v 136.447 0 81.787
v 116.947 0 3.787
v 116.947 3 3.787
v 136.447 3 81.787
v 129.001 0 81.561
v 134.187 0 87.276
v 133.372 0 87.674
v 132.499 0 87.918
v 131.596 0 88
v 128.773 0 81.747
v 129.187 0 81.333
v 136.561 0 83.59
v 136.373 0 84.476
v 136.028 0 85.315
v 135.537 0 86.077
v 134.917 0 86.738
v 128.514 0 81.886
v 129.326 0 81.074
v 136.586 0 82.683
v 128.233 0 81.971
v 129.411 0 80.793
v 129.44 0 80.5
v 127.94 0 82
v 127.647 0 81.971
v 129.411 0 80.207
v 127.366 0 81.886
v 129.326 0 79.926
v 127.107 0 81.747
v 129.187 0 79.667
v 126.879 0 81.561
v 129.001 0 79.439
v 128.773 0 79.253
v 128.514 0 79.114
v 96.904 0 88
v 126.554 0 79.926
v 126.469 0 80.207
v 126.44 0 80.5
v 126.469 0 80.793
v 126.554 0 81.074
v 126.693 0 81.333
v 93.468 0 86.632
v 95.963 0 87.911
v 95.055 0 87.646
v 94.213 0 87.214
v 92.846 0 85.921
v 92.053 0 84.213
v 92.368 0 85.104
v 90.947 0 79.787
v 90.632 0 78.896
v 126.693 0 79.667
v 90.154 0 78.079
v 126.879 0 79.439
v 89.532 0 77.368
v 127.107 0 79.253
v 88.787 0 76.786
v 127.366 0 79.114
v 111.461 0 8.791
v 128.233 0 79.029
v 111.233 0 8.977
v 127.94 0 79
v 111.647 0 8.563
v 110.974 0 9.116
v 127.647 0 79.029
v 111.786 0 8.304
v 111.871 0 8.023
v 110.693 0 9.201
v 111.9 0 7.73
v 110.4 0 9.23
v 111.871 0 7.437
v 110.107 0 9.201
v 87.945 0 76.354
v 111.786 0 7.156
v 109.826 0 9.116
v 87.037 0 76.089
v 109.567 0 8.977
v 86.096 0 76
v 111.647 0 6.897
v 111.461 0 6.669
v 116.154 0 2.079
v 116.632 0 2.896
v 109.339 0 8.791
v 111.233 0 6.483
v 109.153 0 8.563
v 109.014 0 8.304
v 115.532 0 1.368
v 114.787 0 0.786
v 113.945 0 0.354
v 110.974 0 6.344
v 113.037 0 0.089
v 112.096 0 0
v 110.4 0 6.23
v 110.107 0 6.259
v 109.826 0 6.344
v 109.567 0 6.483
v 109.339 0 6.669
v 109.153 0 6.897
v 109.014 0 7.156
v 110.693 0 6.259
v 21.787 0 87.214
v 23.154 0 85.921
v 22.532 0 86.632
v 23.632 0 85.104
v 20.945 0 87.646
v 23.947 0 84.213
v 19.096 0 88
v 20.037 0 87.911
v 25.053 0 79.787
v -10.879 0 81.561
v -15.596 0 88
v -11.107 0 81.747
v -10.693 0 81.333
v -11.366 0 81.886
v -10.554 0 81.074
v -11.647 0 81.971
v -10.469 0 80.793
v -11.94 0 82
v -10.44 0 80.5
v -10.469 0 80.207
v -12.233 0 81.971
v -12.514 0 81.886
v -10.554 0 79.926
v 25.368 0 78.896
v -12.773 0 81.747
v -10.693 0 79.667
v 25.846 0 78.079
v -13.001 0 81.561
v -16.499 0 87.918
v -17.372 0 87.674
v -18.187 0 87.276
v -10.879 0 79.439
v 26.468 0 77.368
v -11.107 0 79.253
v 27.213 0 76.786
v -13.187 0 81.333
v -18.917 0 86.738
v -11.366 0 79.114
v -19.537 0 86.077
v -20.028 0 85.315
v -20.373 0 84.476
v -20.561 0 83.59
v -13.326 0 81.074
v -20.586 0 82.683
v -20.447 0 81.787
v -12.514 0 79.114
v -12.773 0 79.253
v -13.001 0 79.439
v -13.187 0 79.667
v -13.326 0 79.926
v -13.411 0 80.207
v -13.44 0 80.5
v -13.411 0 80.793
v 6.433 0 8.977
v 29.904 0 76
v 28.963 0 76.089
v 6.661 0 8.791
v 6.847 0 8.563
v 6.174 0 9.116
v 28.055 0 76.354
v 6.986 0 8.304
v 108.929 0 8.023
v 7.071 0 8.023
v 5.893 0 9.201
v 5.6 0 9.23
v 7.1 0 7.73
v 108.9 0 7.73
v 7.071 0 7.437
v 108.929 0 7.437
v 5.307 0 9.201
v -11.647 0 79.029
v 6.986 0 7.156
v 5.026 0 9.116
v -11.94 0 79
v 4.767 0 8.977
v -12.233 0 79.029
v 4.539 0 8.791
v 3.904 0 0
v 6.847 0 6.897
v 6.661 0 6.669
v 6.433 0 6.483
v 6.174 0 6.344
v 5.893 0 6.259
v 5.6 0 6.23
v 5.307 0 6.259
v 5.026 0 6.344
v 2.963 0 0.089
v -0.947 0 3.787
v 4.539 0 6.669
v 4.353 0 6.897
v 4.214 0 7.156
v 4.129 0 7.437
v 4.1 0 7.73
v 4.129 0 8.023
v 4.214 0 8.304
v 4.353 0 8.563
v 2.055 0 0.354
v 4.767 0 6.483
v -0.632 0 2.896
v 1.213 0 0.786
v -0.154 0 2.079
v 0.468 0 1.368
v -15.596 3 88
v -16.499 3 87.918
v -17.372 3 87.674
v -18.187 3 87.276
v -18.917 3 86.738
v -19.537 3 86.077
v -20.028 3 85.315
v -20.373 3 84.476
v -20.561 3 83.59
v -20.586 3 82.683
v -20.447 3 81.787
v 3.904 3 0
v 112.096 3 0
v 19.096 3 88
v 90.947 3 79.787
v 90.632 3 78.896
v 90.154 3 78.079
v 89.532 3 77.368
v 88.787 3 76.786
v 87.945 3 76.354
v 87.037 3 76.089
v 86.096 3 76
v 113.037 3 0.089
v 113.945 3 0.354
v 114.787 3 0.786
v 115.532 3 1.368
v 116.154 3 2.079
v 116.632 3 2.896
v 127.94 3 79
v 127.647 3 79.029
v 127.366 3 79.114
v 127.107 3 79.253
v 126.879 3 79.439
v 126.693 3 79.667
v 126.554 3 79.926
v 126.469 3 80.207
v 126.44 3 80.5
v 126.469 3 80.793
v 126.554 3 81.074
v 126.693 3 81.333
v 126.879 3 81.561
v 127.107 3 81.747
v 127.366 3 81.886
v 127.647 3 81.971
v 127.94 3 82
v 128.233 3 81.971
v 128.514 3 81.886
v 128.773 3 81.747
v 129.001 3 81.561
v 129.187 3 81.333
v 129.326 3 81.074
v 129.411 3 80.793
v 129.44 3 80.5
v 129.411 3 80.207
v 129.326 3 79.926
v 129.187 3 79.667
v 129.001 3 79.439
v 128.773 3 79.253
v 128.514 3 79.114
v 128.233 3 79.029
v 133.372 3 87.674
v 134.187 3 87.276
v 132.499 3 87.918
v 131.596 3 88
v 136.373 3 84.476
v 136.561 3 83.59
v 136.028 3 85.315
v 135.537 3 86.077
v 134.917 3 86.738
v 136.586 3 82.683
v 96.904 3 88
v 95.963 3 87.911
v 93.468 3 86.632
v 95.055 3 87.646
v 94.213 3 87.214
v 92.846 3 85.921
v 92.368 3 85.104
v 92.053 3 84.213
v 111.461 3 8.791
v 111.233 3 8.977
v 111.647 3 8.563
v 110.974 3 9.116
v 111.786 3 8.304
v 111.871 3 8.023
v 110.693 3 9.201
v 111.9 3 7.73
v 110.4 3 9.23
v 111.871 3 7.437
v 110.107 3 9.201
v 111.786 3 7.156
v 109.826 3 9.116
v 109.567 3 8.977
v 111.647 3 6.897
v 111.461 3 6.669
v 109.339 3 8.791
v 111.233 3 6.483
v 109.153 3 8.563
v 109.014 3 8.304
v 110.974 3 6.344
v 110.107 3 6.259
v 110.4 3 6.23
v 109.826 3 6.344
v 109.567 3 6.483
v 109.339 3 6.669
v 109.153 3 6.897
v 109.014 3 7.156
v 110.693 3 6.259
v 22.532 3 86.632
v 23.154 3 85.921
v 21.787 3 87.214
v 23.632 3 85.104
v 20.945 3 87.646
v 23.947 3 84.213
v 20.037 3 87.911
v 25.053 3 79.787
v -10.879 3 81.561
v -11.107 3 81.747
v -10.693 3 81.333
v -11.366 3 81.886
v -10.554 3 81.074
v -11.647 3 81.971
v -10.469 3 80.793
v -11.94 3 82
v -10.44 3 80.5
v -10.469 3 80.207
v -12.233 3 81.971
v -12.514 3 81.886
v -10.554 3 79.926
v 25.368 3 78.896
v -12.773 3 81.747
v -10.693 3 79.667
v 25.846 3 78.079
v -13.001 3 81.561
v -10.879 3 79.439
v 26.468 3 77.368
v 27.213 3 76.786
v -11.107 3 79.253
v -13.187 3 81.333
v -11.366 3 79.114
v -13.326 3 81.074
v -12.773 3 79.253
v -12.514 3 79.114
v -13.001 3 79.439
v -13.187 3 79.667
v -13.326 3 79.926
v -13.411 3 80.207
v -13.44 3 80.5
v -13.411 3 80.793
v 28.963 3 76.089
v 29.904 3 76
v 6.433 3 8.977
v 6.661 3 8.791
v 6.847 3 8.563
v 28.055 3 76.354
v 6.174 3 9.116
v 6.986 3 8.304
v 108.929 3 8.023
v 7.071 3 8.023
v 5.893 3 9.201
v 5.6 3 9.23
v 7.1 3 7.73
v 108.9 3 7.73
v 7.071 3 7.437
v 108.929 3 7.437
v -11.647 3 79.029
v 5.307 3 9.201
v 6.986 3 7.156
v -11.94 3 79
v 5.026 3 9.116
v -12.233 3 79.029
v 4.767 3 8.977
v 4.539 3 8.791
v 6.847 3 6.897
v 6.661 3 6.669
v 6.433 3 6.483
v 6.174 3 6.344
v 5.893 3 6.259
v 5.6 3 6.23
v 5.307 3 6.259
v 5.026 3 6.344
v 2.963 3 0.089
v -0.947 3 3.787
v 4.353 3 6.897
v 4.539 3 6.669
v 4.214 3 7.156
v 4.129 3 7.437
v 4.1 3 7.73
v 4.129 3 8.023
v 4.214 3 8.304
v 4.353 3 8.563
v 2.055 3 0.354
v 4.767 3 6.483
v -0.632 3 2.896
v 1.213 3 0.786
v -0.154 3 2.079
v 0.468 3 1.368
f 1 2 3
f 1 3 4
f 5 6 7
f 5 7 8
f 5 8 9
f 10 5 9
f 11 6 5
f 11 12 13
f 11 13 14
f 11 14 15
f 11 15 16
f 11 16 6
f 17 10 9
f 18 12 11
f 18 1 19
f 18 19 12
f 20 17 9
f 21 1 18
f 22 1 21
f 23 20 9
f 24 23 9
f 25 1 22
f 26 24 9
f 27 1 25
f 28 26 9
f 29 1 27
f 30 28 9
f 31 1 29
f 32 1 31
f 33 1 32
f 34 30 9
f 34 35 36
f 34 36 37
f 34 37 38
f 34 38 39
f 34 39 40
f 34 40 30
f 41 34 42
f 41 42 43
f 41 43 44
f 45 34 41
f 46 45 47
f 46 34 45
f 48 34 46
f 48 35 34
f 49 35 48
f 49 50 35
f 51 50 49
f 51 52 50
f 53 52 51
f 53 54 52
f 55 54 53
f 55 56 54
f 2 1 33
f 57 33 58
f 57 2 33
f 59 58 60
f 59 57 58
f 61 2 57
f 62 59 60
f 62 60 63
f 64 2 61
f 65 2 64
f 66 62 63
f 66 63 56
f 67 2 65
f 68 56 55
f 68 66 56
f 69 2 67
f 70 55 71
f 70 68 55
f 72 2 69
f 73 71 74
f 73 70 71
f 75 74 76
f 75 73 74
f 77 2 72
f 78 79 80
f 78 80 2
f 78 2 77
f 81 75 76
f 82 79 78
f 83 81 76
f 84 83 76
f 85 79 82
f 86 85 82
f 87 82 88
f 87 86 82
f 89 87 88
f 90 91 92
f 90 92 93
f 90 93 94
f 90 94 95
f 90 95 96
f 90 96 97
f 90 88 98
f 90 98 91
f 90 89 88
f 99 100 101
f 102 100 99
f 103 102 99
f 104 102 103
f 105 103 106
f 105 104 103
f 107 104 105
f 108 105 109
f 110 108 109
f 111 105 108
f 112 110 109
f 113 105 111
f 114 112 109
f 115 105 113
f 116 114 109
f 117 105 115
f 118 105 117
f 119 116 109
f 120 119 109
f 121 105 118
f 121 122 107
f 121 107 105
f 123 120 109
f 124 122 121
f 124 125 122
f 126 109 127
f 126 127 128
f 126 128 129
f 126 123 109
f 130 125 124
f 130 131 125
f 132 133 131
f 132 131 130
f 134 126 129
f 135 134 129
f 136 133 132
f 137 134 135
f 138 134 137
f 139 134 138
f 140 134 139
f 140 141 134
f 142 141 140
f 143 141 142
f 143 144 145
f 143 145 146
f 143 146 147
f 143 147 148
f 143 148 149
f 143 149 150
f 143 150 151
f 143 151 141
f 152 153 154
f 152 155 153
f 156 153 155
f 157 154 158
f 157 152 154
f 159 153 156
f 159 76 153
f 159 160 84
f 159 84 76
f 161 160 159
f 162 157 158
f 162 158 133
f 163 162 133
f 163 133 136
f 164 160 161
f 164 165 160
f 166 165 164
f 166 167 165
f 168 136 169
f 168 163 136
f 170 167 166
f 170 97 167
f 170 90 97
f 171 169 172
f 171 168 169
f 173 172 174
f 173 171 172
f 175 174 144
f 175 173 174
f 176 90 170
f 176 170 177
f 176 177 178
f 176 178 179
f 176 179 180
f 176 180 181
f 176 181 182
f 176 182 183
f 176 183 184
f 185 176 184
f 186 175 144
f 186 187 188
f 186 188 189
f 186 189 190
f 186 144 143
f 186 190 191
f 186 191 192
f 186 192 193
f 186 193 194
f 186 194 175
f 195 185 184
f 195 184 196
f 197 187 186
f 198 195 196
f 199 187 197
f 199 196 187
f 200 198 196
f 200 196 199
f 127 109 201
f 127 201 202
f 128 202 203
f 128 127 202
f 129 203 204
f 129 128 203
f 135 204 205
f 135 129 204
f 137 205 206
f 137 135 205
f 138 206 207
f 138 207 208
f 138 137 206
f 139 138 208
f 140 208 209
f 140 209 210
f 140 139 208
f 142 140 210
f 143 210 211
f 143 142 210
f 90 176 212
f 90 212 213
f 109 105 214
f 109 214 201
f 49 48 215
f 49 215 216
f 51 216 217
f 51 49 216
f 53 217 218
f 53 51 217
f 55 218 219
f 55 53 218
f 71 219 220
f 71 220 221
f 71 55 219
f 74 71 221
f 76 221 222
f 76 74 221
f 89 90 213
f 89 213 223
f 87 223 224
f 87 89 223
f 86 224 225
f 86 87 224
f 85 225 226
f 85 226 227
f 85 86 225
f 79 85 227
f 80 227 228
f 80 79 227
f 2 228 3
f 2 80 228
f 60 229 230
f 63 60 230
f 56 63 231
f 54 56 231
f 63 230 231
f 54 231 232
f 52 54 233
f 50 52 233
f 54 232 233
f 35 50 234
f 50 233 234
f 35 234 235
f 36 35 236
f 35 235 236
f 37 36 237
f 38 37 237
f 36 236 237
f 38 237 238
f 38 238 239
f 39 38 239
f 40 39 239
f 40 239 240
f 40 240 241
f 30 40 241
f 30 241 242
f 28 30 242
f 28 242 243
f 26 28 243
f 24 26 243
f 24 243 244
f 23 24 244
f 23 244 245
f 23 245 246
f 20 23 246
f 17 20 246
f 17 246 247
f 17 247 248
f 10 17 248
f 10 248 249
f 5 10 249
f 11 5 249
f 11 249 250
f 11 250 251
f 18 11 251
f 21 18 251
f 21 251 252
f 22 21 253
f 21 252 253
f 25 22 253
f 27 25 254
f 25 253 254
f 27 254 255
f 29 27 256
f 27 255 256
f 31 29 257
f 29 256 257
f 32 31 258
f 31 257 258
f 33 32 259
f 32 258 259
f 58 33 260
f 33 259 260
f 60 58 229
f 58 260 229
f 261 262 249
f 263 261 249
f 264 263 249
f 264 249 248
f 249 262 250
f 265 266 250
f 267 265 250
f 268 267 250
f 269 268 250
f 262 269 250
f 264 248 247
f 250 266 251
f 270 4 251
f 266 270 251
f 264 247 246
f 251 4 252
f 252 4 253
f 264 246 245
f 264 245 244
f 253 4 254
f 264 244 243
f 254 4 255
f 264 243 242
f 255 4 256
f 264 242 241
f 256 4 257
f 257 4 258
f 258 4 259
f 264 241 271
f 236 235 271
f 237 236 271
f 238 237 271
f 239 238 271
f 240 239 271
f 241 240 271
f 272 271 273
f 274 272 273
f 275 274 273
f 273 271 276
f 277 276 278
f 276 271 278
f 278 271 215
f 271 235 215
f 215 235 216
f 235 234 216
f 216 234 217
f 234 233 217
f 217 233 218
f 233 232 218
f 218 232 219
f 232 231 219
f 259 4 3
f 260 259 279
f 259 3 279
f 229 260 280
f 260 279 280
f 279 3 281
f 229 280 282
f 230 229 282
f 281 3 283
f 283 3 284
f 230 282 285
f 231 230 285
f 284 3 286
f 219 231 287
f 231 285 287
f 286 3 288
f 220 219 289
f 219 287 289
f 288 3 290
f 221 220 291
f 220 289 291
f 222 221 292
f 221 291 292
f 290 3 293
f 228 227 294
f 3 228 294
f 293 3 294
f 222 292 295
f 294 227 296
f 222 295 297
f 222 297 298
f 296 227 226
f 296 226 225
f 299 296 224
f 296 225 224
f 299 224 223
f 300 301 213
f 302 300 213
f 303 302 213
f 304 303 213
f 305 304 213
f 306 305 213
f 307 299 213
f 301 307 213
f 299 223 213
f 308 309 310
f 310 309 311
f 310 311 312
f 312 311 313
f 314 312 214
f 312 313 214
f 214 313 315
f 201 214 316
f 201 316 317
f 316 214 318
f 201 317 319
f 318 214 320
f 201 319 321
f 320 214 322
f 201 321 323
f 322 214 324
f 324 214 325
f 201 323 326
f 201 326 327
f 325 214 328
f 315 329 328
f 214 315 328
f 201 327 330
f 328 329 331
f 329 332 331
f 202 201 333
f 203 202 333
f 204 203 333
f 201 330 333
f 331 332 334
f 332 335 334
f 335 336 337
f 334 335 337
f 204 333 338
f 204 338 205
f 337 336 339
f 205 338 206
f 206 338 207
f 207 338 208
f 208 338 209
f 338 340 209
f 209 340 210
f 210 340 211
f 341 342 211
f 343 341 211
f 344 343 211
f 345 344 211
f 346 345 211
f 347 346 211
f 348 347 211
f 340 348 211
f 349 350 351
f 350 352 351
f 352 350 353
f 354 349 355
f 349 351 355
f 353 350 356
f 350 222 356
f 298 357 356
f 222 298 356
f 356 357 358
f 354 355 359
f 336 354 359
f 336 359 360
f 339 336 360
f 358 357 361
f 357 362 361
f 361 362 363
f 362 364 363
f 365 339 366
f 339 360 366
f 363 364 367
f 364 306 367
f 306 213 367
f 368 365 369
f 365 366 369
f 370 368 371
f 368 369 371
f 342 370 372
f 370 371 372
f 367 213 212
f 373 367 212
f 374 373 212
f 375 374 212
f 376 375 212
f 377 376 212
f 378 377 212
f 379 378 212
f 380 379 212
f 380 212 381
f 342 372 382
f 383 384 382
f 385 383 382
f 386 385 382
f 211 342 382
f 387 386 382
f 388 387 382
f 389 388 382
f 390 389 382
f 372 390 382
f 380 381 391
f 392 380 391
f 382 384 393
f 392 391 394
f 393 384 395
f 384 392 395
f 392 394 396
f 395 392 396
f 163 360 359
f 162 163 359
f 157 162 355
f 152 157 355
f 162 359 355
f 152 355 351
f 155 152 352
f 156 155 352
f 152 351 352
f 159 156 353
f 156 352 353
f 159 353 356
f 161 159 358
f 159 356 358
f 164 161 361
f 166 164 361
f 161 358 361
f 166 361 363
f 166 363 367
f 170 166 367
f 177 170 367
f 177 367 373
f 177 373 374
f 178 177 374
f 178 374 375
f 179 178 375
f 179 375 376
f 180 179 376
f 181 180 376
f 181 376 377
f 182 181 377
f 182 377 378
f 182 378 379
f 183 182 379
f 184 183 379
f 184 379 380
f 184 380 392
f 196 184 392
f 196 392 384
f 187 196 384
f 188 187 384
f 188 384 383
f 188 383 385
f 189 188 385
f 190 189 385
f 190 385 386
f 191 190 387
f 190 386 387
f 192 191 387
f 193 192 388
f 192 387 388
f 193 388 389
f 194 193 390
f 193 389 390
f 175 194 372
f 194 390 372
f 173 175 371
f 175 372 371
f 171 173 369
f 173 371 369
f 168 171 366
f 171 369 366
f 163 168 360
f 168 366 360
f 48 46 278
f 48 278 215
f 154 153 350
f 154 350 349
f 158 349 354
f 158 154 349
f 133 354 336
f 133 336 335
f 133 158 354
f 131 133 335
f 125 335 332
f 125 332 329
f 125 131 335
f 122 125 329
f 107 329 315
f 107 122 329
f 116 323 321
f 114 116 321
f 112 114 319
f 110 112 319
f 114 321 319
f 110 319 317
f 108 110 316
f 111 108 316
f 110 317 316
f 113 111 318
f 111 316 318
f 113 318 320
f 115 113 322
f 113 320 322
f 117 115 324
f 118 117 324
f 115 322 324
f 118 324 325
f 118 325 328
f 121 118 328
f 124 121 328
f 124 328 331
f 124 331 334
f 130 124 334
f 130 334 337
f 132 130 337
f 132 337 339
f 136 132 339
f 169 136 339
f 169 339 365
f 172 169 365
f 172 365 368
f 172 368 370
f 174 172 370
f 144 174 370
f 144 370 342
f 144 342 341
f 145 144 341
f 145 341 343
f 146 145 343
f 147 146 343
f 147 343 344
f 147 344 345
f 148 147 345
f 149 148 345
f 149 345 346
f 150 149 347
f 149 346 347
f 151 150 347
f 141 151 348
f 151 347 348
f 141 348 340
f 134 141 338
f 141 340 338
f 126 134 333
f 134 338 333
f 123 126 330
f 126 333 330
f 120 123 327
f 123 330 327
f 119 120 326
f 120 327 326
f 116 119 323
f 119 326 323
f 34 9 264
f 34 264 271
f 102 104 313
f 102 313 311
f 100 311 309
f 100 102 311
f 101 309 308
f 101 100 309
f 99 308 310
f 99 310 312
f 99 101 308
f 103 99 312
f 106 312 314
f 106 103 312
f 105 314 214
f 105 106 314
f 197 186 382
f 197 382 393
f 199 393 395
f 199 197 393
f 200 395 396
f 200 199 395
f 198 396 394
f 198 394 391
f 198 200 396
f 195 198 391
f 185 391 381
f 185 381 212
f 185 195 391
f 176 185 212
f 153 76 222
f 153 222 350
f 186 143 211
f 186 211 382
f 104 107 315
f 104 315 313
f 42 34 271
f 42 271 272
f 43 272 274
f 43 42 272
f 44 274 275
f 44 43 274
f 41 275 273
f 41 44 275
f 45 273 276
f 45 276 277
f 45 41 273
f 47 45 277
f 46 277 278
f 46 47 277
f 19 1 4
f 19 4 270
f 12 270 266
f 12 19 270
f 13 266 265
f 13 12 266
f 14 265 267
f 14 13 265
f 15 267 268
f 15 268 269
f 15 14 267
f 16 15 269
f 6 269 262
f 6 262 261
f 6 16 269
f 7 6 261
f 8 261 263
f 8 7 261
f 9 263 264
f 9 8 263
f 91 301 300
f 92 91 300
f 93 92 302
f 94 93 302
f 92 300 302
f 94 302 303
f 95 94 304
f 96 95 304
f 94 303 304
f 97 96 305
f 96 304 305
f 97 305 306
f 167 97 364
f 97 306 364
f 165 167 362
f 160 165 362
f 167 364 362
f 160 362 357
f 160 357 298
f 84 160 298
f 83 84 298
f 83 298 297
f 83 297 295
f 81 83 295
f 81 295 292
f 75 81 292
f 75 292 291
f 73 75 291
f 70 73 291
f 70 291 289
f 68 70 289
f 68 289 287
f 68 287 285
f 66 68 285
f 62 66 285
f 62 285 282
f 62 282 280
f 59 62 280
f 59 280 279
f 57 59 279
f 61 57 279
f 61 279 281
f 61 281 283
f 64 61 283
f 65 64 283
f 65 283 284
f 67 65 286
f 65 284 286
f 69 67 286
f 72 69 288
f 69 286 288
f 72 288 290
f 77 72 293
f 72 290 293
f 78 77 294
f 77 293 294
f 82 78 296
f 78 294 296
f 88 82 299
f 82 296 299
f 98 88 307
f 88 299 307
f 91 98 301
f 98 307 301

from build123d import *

# Parameters (mm, degrees)
Y_KSEKLIK_EKSTR_ZYON1_DEPTH = 3
IZIM2_R                     = 1.5
KES_EKSTR_ZYON1_DEPTH       = 10
IZIM4_R                     = 1.5
KES_EKSTR_ZYON2_DEPTH       = 10


with BuildPart() as part:
    # Çizim1 → Yükseklik-Ekstrüzyon1 (new body)
    with BuildSketch(Plane(origin=(0, 0, 0), x_dir=(1, 0, 0), z_dir=(0, 1, 0))):
        with BuildLine():
            Line((3.903882032, 0), (112.096117968, 0))
            ThreePointArc((112.096117968, 0), (115.173179015, -1.05897281), (116.946830469, -3.787321875))
            Line((116.946830469, -3.787321875), (136.446830469, -81.787321875))
            ThreePointArc((136.446830469, -81.787321875), (135.537145158, -86.077061047), (131.596117968, -88))
            Line((131.596117968, -88), (96.903882032, -88))
            ThreePointArc((96.903882032, -88), (93.826820985, -86.94102719), (92.053169531, -84.212678125))
            Line((92.053169531, -84.212678125), (90.946830469, -79.787321875))
            ThreePointArc((90.946830469, -79.787321875), (89.173179015, -77.05897281), (86.096117968, -76))
            Line((86.096117968, -76), (29.903882032, -76))
            ThreePointArc((29.903882032, -76), (26.826820985, -77.05897281), (25.053169531, -79.787321875))
            Line((25.053169531, -79.787321875), (23.946830469, -84.212678125))
            ThreePointArc((23.946830469, -84.212678125), (22.173179015, -86.94102719), (19.096117968, -88))
            Line((19.096117968, -88), (-15.596117968, -88))
            ThreePointArc((-15.596117968, -88), (-19.537145158, -86.077061047), (-20.446830469, -81.787321875))
            Line((-20.446830469, -81.787321875), (-0.946830469, -3.787321875))
            ThreePointArc((-0.946830469, -3.787321875), (0.826820985, -1.05897281), (3.903882032, 0))
        make_face()
    extrude(amount=Y_KSEKLIK_EKSTR_ZYON1_DEPTH)

    # Çizim2 → Kes-Ekstrüzyon1 (cut)
    with BuildSketch(Plane(origin=(0, 3, 0), x_dir=(1, 0, 0), z_dir=(0, 1, 0))):
        with Locations(Location((5.6, -7.73, 0), (0, 0, 270))):
            Circle(IZIM2_R)
        with Locations(Location((110.4, -7.73, 0), (0, 0, 90))):
            Circle(IZIM2_R)
    extrude(amount=-KES_EKSTR_ZYON1_DEPTH, mode=Mode.SUBTRACT)

    # Çizim4 → Kes-Ekstrüzyon2 (cut)
    with BuildSketch(Plane(origin=(0, 3, 0), x_dir=(1, 0, 0), z_dir=(0, 1, 0))):
        with Locations(Location((-11.94, -80.5, 0), (0, 0, 270))):
            Circle(IZIM4_R)
        with Locations(Location((127.94, -80.5, 0), (0, 0, 90))):
            Circle(IZIM4_R)
    extrude(amount=-KES_EKSTR_ZYON2_DEPTH, mode=Mode.SUBTRACT)


solid = part.part
